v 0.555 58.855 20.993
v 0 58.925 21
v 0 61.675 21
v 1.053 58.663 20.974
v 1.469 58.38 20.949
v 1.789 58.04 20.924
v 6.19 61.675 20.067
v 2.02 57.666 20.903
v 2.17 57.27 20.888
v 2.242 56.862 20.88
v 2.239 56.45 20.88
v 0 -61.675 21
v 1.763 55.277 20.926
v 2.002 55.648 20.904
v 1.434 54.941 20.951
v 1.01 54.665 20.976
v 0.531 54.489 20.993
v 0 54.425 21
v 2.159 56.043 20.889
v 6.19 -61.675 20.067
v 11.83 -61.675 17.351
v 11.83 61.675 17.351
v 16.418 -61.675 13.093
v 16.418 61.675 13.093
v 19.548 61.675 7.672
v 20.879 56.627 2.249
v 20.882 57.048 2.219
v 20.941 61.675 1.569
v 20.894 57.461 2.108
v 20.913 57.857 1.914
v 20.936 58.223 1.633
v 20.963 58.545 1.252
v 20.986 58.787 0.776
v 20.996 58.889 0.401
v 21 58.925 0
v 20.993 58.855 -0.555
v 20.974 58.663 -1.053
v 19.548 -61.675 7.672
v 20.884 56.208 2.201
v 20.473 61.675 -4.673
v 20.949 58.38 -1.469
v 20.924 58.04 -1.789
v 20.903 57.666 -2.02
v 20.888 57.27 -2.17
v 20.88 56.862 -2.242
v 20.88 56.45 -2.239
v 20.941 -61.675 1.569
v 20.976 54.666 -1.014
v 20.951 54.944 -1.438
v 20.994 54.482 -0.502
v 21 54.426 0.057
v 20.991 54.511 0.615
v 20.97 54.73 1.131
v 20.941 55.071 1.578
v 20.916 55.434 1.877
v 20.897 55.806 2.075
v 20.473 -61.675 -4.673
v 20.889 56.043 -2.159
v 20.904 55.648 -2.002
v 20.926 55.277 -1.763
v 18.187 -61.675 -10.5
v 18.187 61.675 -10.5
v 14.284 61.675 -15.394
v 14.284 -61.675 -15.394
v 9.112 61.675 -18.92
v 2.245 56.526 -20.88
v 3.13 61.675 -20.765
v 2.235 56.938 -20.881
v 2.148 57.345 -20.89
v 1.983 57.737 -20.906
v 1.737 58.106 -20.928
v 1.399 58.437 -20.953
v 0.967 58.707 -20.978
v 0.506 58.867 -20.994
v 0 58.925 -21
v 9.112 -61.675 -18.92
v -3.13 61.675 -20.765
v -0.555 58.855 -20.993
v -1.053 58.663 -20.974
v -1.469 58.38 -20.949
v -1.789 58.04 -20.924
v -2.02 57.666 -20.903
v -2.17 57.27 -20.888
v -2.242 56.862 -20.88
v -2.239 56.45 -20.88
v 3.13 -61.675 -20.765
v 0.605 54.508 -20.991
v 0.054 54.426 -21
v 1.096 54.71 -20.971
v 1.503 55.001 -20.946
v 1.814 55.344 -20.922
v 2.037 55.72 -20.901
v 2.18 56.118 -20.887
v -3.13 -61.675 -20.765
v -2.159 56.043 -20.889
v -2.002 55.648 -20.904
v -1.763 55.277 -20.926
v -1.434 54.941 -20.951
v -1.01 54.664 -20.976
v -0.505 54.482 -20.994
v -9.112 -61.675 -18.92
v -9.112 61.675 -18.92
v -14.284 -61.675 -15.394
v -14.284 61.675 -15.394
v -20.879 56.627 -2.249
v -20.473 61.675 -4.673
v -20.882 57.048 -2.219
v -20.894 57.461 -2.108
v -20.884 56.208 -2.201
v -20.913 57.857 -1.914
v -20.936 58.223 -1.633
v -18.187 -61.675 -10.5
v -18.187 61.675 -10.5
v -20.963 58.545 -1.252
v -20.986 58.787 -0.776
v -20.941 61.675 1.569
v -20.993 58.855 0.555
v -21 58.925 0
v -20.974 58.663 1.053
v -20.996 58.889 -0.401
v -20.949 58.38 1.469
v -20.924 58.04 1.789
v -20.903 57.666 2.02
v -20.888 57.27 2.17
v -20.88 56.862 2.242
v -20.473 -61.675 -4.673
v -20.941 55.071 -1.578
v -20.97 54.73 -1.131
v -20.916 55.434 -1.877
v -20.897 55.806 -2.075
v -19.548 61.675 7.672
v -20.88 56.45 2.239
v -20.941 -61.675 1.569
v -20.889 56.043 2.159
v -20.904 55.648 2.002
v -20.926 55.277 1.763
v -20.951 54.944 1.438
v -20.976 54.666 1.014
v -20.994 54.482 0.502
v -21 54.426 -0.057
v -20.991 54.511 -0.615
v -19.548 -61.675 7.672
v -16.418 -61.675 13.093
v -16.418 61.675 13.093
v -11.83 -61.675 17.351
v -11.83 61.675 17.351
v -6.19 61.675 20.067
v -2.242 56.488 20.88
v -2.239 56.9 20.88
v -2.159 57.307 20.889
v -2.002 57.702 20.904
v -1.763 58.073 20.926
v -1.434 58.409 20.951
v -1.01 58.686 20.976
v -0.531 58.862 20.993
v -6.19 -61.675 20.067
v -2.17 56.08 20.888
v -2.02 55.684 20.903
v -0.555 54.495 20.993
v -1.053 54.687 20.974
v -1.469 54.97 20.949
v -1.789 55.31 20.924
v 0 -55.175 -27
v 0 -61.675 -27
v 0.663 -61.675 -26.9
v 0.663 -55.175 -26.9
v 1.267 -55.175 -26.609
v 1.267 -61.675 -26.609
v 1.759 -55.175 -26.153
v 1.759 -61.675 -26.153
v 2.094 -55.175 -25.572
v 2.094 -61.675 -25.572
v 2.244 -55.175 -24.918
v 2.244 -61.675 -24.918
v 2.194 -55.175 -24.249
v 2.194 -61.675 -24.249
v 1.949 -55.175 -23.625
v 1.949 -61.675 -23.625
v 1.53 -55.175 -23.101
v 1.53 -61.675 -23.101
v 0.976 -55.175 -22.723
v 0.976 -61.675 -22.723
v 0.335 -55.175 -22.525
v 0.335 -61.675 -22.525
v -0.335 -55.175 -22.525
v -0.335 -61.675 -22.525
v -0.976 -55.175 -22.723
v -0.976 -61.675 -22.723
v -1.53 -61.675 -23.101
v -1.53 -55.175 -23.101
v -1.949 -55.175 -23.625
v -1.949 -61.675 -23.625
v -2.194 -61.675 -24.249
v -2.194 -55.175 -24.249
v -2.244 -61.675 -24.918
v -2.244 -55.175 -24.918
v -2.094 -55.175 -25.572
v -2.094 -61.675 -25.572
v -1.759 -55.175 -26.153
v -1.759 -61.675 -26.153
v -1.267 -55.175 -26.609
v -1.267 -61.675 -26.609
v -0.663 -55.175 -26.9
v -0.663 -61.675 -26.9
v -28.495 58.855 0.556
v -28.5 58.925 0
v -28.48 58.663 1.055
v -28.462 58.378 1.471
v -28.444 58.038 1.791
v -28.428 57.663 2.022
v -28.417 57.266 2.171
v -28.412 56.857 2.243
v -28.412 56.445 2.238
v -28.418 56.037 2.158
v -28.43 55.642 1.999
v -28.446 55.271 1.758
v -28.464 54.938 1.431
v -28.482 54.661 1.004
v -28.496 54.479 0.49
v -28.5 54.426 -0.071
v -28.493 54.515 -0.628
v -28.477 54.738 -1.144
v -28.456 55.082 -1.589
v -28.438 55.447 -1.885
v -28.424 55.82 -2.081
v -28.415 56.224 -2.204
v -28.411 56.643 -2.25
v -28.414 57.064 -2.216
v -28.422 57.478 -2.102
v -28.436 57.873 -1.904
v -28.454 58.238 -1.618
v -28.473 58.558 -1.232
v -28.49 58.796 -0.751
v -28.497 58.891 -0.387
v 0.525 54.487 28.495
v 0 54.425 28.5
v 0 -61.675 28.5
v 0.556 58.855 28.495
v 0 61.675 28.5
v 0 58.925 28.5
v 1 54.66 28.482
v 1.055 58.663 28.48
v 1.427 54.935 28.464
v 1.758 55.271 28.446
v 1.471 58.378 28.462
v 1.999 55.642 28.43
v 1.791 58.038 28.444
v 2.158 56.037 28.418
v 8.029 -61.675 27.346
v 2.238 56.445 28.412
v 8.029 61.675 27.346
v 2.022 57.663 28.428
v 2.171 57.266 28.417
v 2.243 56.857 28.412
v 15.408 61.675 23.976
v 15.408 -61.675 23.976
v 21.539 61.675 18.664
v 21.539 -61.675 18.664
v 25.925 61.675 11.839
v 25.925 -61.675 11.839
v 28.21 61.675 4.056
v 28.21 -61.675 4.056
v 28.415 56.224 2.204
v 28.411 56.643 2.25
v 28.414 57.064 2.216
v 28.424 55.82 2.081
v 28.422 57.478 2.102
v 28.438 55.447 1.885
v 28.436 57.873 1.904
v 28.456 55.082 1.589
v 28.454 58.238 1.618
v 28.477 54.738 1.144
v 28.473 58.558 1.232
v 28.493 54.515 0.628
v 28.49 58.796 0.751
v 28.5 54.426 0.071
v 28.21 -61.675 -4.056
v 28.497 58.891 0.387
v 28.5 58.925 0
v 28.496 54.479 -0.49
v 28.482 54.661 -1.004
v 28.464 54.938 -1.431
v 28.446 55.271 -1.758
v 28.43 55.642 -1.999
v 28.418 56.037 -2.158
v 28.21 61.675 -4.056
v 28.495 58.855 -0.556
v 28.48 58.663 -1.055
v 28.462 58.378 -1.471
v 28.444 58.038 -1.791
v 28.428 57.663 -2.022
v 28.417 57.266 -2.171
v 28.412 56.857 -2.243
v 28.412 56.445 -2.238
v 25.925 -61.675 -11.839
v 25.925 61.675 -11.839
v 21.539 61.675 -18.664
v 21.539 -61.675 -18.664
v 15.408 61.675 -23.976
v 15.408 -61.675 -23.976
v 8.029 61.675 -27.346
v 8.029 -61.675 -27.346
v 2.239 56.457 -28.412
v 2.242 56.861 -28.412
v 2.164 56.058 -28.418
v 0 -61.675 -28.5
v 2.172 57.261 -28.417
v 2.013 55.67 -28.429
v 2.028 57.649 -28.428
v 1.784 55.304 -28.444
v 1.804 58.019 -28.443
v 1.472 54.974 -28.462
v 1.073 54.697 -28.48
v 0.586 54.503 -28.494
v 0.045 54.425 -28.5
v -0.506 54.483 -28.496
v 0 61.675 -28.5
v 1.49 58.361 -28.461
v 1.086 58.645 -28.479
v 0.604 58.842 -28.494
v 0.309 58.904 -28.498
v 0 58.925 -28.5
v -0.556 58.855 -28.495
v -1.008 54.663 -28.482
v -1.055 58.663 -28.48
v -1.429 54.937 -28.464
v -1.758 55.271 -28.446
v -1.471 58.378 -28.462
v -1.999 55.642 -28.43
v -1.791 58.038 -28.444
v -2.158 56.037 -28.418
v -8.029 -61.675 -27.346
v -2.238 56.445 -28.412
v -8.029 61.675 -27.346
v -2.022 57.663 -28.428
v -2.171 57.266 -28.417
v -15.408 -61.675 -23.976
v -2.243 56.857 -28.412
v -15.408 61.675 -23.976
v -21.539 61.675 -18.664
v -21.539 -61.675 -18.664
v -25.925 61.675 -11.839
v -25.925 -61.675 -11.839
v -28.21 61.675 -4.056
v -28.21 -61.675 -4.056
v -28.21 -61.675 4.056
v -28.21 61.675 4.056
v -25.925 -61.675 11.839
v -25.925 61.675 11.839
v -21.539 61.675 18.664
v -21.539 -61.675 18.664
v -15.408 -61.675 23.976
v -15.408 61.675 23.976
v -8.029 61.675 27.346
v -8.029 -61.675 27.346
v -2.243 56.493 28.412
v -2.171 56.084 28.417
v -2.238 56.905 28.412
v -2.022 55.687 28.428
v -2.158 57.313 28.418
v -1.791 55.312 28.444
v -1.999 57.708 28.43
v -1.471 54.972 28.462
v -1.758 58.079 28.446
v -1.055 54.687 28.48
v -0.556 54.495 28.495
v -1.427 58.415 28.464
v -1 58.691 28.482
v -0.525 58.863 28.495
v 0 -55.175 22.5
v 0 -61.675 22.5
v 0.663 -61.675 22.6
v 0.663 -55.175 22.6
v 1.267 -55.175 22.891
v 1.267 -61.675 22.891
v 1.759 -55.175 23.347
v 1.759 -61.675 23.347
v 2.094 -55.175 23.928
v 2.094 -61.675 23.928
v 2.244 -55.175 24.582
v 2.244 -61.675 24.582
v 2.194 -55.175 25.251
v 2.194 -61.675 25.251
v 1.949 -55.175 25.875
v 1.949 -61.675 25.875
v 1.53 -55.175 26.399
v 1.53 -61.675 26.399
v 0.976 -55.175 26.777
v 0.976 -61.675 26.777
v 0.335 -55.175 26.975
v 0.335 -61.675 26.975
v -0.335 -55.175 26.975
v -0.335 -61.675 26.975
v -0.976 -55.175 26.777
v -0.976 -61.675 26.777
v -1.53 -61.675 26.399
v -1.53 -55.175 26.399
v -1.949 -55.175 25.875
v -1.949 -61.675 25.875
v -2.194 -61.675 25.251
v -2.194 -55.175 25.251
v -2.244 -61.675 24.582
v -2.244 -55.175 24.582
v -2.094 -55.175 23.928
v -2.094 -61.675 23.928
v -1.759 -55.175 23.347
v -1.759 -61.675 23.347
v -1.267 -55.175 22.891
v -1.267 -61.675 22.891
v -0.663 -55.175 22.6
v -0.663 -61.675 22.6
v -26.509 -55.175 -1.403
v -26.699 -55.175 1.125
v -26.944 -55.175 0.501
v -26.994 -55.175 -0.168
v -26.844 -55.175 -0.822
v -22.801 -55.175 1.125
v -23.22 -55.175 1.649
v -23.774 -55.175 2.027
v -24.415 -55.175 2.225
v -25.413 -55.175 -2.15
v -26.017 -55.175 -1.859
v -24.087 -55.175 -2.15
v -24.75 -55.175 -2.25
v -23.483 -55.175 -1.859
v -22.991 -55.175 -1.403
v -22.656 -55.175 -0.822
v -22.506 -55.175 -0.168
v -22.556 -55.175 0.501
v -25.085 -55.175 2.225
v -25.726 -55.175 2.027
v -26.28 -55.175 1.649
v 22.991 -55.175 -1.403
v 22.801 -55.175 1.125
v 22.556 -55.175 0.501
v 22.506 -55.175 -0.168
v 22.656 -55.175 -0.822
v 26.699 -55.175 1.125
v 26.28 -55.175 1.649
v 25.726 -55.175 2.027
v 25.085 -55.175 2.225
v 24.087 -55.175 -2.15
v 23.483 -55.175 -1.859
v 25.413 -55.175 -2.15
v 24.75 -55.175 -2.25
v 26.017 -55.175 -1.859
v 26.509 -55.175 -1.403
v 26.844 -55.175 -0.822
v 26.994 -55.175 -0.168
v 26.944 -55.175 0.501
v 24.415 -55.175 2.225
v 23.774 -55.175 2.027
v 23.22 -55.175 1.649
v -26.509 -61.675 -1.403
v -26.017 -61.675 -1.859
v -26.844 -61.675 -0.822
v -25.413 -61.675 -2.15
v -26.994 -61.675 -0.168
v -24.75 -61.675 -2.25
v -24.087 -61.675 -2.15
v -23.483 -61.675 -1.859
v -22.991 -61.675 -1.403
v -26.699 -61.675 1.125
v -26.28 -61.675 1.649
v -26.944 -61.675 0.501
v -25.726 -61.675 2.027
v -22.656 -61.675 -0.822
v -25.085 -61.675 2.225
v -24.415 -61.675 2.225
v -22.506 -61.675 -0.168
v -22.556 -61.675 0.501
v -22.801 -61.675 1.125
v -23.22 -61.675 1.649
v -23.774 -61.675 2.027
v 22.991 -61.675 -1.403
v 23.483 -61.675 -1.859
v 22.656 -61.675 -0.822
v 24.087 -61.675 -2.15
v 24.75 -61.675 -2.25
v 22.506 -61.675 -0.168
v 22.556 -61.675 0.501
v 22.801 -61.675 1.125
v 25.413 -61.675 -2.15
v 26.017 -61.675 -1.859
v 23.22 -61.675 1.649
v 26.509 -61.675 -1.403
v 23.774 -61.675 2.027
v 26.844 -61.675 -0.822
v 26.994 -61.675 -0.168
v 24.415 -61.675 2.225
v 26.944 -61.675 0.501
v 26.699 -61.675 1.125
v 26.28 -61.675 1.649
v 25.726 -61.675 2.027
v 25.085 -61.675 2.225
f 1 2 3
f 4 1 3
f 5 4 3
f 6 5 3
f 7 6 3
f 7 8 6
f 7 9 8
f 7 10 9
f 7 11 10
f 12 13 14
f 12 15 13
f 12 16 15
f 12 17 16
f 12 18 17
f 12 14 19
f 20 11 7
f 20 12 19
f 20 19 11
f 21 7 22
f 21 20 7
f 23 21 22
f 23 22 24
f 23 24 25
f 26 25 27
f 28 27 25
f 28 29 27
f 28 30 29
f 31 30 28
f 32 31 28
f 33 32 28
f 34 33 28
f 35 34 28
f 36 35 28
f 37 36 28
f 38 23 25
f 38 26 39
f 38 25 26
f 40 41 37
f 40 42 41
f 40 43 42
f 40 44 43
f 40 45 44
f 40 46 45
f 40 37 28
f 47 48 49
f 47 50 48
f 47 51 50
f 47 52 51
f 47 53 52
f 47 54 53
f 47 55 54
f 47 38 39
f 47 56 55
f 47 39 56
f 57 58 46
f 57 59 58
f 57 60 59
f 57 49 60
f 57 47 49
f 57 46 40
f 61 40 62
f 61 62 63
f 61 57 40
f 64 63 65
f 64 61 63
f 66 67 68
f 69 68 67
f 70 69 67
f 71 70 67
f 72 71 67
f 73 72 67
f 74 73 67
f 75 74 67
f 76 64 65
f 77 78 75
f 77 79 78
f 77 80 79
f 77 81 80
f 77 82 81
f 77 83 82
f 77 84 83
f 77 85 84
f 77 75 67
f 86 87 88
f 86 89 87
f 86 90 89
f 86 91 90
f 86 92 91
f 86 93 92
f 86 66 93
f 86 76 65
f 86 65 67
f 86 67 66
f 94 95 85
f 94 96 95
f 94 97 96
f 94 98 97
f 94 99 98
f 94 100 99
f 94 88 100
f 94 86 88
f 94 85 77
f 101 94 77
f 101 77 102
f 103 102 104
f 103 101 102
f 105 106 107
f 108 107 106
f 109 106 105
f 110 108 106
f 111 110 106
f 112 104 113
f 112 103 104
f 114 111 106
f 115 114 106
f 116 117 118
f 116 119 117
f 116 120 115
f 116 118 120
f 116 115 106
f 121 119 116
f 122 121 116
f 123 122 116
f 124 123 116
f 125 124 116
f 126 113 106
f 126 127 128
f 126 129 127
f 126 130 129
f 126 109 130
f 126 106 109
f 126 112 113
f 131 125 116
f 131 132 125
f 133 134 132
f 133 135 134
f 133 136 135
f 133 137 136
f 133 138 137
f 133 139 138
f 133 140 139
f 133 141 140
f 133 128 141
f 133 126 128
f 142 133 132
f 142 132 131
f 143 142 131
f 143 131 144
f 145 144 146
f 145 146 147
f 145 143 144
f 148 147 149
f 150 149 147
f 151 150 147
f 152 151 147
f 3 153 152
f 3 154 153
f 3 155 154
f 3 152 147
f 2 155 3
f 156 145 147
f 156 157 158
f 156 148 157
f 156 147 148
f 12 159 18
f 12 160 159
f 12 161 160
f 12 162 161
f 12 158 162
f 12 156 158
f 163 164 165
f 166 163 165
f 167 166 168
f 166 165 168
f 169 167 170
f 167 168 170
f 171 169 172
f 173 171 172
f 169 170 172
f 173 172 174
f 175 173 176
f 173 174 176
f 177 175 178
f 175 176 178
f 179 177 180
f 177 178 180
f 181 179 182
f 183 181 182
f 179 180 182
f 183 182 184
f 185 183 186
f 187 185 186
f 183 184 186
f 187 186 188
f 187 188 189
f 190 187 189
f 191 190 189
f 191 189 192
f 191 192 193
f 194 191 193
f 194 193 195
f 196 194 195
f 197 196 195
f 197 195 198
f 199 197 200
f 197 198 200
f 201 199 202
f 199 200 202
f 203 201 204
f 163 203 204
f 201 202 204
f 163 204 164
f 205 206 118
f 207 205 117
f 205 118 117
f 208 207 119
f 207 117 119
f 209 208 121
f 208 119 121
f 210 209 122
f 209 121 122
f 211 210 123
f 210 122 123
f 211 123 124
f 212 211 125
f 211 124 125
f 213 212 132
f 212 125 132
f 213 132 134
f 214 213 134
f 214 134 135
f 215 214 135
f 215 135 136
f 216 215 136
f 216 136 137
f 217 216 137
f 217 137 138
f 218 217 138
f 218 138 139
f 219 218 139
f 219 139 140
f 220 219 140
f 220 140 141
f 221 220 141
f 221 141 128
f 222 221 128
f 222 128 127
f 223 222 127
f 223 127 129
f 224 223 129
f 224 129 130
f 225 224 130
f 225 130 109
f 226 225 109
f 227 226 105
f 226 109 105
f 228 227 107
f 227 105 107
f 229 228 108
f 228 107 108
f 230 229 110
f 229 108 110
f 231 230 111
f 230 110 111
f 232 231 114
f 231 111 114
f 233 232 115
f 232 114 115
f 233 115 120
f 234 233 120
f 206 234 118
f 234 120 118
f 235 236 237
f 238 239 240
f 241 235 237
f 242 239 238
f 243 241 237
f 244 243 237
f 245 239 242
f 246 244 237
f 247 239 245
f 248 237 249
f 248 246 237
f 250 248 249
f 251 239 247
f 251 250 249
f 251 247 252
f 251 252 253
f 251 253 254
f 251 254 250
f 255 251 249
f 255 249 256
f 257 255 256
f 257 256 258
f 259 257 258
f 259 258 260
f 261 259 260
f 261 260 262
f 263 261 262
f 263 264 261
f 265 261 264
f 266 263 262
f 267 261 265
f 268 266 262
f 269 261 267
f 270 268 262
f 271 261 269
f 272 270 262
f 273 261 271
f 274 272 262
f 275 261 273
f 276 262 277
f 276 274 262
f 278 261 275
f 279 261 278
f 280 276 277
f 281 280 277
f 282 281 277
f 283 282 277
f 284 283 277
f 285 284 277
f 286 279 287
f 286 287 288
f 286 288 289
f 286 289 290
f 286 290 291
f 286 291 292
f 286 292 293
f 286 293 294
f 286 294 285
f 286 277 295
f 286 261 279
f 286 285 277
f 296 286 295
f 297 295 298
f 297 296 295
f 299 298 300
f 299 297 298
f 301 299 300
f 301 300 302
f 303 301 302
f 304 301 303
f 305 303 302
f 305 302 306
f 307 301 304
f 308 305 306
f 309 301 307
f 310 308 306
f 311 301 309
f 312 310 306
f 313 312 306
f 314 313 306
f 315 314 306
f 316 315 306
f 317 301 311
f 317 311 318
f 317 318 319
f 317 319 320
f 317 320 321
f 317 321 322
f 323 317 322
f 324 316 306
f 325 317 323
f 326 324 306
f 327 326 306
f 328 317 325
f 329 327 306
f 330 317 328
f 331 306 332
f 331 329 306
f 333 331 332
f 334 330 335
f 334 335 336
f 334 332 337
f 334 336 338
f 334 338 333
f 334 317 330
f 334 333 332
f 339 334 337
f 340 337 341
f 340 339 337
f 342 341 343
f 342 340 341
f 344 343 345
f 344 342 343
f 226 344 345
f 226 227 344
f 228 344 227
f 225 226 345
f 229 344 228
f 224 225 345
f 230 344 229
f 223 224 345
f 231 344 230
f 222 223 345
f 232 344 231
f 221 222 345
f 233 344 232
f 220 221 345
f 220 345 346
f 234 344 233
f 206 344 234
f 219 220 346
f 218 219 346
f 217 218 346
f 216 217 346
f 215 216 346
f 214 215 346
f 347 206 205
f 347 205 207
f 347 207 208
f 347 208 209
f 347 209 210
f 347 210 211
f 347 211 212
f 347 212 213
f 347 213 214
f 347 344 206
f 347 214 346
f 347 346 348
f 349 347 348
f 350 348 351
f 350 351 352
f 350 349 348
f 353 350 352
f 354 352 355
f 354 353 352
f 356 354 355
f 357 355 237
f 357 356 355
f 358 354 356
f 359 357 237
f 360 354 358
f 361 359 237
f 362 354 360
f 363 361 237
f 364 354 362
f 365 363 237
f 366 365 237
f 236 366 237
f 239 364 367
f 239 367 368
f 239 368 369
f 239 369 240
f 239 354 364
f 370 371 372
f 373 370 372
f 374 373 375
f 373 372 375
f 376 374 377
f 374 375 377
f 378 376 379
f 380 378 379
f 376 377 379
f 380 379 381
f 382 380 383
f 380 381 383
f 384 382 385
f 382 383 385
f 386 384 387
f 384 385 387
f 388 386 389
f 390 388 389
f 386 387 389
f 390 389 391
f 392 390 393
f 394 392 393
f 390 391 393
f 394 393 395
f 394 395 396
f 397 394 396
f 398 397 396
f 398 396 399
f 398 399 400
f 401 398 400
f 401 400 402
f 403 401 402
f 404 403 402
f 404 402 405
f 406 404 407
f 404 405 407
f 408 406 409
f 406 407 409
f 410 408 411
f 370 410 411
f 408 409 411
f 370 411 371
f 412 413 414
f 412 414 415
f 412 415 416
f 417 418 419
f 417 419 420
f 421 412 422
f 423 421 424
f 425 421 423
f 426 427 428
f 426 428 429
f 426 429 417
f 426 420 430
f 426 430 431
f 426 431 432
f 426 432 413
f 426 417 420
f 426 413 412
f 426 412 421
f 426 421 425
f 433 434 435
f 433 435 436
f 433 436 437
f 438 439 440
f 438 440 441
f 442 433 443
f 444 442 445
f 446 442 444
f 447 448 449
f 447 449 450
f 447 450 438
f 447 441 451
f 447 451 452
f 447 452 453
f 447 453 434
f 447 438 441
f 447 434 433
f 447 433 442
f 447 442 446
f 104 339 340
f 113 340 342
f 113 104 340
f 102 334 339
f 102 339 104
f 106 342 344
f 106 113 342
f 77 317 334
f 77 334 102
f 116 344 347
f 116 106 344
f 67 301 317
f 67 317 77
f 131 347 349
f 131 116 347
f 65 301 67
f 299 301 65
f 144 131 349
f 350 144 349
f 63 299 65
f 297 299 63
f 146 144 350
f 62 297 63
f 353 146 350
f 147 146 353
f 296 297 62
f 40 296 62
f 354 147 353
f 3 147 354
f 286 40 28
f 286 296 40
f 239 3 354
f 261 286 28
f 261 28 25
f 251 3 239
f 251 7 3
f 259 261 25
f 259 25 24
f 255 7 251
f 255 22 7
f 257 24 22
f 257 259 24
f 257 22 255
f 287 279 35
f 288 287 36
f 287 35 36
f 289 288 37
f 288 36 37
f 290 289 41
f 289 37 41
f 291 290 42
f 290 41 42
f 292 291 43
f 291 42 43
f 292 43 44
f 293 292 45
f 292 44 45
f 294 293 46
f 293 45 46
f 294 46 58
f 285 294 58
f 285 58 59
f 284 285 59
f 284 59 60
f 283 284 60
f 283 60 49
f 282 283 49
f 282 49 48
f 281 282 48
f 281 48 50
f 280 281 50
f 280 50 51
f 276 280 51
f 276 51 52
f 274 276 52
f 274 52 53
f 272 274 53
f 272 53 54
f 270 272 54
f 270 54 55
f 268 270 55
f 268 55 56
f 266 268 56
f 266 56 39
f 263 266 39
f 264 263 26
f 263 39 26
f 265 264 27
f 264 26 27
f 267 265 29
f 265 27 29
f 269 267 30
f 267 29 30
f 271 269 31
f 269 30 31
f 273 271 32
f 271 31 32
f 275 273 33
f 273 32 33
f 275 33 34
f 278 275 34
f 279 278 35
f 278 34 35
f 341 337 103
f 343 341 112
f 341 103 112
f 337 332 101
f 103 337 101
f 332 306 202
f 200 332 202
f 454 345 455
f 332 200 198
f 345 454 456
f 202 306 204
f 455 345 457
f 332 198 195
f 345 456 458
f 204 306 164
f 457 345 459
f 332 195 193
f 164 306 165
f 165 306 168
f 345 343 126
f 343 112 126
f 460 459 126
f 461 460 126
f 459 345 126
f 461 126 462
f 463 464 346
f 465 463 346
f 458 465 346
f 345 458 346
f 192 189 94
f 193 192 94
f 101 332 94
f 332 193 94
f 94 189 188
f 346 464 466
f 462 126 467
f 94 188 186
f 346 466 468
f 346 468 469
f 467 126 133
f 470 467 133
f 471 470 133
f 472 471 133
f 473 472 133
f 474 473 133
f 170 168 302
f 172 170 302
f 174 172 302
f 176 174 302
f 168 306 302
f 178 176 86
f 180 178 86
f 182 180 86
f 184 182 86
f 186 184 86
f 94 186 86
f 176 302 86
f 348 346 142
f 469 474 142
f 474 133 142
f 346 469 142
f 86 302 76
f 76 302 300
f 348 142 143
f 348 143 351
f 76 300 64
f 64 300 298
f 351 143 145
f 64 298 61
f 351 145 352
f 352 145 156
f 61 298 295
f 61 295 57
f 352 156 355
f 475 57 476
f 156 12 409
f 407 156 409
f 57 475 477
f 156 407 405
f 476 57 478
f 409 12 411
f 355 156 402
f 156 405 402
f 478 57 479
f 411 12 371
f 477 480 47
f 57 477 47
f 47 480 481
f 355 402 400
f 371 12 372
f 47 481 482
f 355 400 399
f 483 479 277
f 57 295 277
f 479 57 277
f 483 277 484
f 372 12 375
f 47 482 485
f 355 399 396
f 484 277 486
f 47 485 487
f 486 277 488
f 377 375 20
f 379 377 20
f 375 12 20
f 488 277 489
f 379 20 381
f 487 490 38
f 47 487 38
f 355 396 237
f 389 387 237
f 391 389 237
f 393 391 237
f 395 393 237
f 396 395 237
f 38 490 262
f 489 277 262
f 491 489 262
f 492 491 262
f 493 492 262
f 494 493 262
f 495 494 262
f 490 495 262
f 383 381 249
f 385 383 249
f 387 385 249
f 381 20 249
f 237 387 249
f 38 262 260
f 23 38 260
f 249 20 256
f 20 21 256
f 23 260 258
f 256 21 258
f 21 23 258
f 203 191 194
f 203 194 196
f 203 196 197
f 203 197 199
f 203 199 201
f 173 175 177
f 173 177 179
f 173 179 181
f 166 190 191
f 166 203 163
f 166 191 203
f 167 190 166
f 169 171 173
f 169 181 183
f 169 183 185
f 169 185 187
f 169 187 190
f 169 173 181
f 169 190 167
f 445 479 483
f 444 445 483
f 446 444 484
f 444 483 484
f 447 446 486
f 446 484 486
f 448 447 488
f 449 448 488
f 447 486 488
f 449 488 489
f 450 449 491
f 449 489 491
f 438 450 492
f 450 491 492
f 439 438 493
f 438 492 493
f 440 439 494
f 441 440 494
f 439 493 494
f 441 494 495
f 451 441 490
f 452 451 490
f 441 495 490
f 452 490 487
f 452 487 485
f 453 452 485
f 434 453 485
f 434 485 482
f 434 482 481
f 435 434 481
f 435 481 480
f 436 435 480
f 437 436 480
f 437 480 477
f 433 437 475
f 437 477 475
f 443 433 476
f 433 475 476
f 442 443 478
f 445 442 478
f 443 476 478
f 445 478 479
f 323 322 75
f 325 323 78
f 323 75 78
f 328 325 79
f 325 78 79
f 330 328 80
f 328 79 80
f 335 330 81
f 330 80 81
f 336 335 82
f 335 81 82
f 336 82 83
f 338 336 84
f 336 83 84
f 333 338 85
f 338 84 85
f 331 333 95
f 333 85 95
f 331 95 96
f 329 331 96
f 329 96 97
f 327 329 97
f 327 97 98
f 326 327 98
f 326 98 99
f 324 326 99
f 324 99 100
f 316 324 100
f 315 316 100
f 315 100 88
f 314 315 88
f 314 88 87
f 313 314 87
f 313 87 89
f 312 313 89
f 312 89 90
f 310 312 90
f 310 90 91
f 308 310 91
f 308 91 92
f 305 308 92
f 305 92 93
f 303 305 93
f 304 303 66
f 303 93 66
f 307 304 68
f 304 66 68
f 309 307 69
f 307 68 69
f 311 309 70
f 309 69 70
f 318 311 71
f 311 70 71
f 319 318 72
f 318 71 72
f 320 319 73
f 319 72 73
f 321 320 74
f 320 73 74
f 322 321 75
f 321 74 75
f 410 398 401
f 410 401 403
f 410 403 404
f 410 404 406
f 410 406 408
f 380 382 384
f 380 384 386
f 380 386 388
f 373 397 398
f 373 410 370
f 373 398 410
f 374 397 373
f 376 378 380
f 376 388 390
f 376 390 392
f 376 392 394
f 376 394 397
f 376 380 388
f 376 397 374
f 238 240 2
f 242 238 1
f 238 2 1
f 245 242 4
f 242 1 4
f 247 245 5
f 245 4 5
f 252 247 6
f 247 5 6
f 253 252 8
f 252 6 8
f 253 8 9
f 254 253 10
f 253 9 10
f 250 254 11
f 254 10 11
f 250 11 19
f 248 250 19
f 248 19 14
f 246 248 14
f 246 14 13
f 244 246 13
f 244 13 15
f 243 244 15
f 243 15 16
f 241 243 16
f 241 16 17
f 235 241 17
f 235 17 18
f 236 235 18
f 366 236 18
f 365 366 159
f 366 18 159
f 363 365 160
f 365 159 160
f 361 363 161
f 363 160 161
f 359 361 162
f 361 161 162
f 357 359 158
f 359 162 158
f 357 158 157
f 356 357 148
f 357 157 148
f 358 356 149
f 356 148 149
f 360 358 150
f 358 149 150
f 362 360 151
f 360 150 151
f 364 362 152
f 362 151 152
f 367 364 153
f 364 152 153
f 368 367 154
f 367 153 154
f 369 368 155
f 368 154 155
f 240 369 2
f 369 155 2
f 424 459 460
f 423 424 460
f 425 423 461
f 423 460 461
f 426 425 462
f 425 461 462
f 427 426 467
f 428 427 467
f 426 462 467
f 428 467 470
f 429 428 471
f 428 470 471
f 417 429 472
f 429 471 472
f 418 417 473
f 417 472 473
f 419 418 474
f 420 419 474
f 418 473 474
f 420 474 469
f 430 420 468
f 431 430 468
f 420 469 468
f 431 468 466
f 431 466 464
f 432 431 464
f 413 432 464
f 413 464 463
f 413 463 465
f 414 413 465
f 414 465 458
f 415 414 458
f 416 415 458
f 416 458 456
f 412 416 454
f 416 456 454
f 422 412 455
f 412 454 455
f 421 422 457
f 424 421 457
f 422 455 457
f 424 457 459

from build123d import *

# Parameters (mm, degrees)
SKETCH1_R           = 28.5
SKETCH1_R_2         = 21
BOSS_EXTRUDE1_DEPTH = 61.675
SKETCH2_R           = 2.25
CUT_EXTRUDE1_DEPTH  = 74.677035941
CIRPATTERN1_COUNT   = 4
SKETCH3_R           = 2.25
CUT_EXTRUDE2_DEPTH  = 6.5


with BuildPart() as part:
    # Sketch1 → Boss-Extrude1 (new, symmetric)
    with BuildSketch(Plane(origin=(0, 0, 0), x_dir=(1, 0, 0), z_dir=(0, 1, 0))):
        with Locations(Location((0, 0, 0), (0, 0, 270))):
            Circle(SKETCH1_R)
        with Locations(Location((0, 0, 0), (0, 0, 270))):
            Circle(SKETCH1_R_2, mode=Mode.SUBTRACT)
    extrude(amount=BOSS_EXTRUDE1_DEPTH, both=True)

    # Sketch2 → Cut-Extrude1 (cut, through all)
    with BuildSketch(Plane.XY):
        with Locations(Location((0, 56.675, 0), (0, 0, 90))):
            Circle(SKETCH2_R)
    cut_extrude1 = extrude(amount=-CUT_EXTRUDE1_DEPTH, mode=Mode.SUBTRACT)

    # CirPattern1: Cut-Extrude1 ×4 about axis
    cirpattern1_axis = Axis((0, 61.675, 0), (0, -1, 0))
    for i in range(1, CIRPATTERN1_COUNT):
        add(cut_extrude1.rotate(cirpattern1_axis, i * 360 / CIRPATTERN1_COUNT), mode=Mode.SUBTRACT)

    # Sketch3 → Cut-Extrude2 (cut)
    with BuildSketch(Plane.XZ.offset(61.675)):
        with Locations(Location((0, 24.75, 0), (0, 0, 270))):
            Circle(SKETCH3_R)
        with Locations(Location((24.75, 0, 0), (0, 0, 270))):
            Circle(SKETCH3_R)
        with Locations(Location((0, -24.75, 0), (0, 0, 270))):
            Circle(SKETCH3_R)
        with Locations(Location((-24.75, 0, 0), (0, 0, 270))):
            Circle(SKETCH3_R)
    extrude(amount=-CUT_EXTRUDE2_DEPTH, mode=Mode.SUBTRACT)


solid = part.part
